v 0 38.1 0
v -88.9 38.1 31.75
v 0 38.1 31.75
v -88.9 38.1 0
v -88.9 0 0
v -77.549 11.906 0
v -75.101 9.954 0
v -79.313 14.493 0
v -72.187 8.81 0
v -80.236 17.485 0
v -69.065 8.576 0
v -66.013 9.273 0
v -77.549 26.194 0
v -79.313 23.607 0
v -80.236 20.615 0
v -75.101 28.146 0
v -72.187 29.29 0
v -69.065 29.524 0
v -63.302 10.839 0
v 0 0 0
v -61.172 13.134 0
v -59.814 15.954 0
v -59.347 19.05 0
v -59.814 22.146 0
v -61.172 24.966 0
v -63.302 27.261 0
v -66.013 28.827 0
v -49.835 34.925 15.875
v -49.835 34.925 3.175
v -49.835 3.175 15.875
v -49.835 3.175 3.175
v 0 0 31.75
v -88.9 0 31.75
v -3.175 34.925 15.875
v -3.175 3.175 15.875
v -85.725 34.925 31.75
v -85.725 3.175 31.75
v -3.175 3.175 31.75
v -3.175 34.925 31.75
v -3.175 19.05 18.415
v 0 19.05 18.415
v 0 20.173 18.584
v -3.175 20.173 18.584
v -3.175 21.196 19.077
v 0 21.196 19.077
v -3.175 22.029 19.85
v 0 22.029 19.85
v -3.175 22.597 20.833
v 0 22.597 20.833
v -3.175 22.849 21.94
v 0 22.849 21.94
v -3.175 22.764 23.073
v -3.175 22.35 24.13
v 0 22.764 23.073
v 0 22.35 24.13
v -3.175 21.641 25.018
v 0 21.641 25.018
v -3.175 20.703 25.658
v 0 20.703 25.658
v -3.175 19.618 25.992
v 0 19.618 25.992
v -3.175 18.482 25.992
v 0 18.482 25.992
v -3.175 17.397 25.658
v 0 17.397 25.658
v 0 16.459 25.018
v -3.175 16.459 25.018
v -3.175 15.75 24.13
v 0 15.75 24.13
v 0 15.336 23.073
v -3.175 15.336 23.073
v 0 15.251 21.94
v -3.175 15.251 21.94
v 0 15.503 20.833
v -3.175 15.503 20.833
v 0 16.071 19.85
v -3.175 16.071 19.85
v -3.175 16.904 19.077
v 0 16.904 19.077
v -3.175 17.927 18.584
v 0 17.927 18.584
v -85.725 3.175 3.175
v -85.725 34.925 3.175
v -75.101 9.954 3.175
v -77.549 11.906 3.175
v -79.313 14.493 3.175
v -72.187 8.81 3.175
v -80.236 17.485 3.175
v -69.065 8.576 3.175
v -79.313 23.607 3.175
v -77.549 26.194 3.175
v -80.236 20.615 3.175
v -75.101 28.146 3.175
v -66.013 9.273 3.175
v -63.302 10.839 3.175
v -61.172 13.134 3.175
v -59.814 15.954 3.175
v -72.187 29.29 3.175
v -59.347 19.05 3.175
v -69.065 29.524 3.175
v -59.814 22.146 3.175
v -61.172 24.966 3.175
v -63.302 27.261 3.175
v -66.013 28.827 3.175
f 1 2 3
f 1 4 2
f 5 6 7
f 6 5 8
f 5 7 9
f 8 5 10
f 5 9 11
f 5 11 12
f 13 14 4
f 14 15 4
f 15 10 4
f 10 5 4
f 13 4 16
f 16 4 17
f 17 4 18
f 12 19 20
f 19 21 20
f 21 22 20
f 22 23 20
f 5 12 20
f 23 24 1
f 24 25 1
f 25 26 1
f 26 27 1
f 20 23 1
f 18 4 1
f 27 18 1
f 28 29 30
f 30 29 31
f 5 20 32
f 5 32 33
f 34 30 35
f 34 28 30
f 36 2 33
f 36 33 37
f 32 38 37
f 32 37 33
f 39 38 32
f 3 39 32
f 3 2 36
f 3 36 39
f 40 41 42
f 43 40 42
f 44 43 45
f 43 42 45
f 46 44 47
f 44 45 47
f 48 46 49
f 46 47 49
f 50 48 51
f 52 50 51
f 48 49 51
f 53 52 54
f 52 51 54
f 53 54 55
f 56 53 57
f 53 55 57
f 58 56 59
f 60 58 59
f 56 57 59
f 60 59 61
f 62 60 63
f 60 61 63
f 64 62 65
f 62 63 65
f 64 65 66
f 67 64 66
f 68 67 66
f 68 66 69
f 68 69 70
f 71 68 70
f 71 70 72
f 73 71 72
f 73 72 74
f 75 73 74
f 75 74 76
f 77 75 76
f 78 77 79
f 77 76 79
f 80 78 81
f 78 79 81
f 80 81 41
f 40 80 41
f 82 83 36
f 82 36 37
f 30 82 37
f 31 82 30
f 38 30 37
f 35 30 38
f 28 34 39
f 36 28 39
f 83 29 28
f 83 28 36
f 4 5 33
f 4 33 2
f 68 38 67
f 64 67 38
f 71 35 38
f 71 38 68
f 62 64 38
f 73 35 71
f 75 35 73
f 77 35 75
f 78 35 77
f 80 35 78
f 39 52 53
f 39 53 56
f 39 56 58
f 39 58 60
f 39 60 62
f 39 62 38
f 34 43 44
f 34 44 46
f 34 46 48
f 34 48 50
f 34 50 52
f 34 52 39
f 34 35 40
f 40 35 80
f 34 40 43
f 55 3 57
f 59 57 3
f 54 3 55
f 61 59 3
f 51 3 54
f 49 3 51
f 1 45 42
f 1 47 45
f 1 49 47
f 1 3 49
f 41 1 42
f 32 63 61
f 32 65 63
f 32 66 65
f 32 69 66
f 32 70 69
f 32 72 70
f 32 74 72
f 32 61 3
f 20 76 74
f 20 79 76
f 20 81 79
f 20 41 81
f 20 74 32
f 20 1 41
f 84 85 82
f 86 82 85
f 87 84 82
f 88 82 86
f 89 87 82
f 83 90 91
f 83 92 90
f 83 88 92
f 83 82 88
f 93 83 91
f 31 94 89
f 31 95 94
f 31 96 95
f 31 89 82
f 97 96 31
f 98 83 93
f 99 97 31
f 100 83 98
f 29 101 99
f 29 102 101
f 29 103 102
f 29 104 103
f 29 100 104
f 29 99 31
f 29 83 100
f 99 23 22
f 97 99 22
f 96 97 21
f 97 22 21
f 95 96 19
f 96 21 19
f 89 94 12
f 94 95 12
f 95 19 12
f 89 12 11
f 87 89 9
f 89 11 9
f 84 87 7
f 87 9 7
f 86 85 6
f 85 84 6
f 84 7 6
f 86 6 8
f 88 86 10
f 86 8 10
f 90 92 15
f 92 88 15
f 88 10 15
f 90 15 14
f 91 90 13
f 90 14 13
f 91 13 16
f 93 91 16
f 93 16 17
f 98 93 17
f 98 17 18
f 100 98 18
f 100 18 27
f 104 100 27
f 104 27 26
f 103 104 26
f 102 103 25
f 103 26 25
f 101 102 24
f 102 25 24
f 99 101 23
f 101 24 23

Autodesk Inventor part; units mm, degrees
ref_plane "YZ Plane" through (0, 0, 0) normal (1, 0, 0) x (0, 1, 0)
ref_plane "XZ Plane" through (0, 0, 0) normal (0, 1, 0) x (-1, 0, 0)
ref_plane "XY Plane" through (0, 0, 0) normal (0, 0, 1) x (1, 0, 0)
sketch "Sketch1" plane through (0, 0, 0) normal (0, 0, 1) x (1, 0, 0)
  line L0 (0, 0) -> (-88.9, 0)
  line L1 (-88.9, 0) -> (-88.9, 38.1)
  line L2 (-88.9, 38.1) -> (0, 38.1)
  line L3 (0, 38.1) -> (0, 0)
  circle A0 centre (-69.85, 19.05) radius 10.5029
  dimension "d0" = 88.9
  dimension "d1" = 38.1
  dimension "d2" = 21.0058
  dimension "d3" = 19.05
  dimension "d4" = 19.05
extrude "Extrusion1" add sketch "Sketch1" along normal blind 3.175
sketch "Sketch2" plane through (0, 0, 3.175) normal (0, 0, 1) x (1, 0, 0)
  line L0 (-88.9, 38.1) -> (-88.9, 0) projected
  line L1 (0, 0) -> (0, 38.1) projected
  line L2 (-88.9, 38.1) -> (0, 38.1)
  line L3 (0, 38.1) -> (0, 0)
  line L4 (0, 0) -> (-88.9, 0)
  line L5 (-88.9, 0) -> (-88.9, 38.1)
  line L6 (-3.175, 34.925) -> (-85.725, 34.925)
  line L7 (-85.725, 34.925) -> (-85.725, 3.175)
  line L8 (-85.725, 3.175) -> (-3.175, 3.175)
  line L9 (-3.175, 3.175) -> (-3.175, 34.925)
  dimension "d7" = 3.175
extrude "Extrusion2" add sketch "Sketch2" along normal blind 28.575
sketch "Sketch3" plane through (0, 0, 3.175) normal (0, 0, 1) x (1, 0, 0)
  line L0 (-3.175, 34.925) -> (-3.175, 3.175) projected
  line L1 (-85.725, 3.175) -> (-3.175, 3.175) projected
  line L2 (-3.175, 34.925) -> (-49.8348, 34.925)
  line L3 (-49.8348, 34.925) -> (-49.8348, 3.175)
  line L4 (-49.8348, 3.175) -> (-3.175, 3.175)
  line L5 (-3.175, 3.175) -> (-3.175, 34.925)
  point P0 (0, 0)
  dimension "d10" = 46.6598
extrude "Extrusion3" add sketch "Sketch3" along normal blind 12.7
sketch "Sketch4" plane through (0, 0, 0) normal (1, 0, 0) x (0, 0, -1)
  circle A0 centre (-22.225, 19.05) radius 3.81
  line L0 (-31.75, 0) -> (-31.75, 38.1) projected
  point P0 (0, 0)
  dimension "d13" = 7.62
  dimension "d14" = 9.525
extrude "Extrusion4" cut sketch "Sketch4" against normal blind 19.05
properties part number "escbox"
